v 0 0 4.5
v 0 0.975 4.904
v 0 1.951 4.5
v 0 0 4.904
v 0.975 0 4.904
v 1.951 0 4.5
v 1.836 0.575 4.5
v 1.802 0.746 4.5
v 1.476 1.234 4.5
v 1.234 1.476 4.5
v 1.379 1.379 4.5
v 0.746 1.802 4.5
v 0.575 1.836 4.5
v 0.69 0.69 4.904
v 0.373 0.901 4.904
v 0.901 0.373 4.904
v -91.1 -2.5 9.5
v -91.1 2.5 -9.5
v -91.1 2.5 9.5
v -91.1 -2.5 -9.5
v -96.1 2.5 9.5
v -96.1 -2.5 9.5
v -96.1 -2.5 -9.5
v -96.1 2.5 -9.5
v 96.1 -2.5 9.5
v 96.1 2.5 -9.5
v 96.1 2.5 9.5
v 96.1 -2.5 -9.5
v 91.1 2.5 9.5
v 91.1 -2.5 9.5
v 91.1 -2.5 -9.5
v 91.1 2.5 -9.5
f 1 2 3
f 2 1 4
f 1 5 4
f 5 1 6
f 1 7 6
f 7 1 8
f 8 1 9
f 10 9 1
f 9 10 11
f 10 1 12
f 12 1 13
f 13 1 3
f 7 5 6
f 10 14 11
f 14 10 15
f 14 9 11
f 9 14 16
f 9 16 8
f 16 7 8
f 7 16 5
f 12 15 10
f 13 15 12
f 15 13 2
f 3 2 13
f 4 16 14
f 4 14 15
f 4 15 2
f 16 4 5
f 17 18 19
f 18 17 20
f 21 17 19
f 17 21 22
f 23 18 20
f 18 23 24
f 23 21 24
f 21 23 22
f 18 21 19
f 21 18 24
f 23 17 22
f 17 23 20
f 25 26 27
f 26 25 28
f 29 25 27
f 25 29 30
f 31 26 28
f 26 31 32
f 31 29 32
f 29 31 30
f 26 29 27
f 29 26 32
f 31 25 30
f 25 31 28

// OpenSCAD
union(){
    intersection(){
        difference(){
            cube(size=[187.2, 96.4, 29]);
            cube(size=[167.2, 76.4, 9], center=true);
        };
        sphere(r=5);
    };
    translate(v=[-93.6, 0, 0]){
        cube(size=[5, 5, 19], center=true);
    };
    translate(v=[93.6, 0, 0]){
        cube(size=[5, 5, 19], center=true);
    };
};
